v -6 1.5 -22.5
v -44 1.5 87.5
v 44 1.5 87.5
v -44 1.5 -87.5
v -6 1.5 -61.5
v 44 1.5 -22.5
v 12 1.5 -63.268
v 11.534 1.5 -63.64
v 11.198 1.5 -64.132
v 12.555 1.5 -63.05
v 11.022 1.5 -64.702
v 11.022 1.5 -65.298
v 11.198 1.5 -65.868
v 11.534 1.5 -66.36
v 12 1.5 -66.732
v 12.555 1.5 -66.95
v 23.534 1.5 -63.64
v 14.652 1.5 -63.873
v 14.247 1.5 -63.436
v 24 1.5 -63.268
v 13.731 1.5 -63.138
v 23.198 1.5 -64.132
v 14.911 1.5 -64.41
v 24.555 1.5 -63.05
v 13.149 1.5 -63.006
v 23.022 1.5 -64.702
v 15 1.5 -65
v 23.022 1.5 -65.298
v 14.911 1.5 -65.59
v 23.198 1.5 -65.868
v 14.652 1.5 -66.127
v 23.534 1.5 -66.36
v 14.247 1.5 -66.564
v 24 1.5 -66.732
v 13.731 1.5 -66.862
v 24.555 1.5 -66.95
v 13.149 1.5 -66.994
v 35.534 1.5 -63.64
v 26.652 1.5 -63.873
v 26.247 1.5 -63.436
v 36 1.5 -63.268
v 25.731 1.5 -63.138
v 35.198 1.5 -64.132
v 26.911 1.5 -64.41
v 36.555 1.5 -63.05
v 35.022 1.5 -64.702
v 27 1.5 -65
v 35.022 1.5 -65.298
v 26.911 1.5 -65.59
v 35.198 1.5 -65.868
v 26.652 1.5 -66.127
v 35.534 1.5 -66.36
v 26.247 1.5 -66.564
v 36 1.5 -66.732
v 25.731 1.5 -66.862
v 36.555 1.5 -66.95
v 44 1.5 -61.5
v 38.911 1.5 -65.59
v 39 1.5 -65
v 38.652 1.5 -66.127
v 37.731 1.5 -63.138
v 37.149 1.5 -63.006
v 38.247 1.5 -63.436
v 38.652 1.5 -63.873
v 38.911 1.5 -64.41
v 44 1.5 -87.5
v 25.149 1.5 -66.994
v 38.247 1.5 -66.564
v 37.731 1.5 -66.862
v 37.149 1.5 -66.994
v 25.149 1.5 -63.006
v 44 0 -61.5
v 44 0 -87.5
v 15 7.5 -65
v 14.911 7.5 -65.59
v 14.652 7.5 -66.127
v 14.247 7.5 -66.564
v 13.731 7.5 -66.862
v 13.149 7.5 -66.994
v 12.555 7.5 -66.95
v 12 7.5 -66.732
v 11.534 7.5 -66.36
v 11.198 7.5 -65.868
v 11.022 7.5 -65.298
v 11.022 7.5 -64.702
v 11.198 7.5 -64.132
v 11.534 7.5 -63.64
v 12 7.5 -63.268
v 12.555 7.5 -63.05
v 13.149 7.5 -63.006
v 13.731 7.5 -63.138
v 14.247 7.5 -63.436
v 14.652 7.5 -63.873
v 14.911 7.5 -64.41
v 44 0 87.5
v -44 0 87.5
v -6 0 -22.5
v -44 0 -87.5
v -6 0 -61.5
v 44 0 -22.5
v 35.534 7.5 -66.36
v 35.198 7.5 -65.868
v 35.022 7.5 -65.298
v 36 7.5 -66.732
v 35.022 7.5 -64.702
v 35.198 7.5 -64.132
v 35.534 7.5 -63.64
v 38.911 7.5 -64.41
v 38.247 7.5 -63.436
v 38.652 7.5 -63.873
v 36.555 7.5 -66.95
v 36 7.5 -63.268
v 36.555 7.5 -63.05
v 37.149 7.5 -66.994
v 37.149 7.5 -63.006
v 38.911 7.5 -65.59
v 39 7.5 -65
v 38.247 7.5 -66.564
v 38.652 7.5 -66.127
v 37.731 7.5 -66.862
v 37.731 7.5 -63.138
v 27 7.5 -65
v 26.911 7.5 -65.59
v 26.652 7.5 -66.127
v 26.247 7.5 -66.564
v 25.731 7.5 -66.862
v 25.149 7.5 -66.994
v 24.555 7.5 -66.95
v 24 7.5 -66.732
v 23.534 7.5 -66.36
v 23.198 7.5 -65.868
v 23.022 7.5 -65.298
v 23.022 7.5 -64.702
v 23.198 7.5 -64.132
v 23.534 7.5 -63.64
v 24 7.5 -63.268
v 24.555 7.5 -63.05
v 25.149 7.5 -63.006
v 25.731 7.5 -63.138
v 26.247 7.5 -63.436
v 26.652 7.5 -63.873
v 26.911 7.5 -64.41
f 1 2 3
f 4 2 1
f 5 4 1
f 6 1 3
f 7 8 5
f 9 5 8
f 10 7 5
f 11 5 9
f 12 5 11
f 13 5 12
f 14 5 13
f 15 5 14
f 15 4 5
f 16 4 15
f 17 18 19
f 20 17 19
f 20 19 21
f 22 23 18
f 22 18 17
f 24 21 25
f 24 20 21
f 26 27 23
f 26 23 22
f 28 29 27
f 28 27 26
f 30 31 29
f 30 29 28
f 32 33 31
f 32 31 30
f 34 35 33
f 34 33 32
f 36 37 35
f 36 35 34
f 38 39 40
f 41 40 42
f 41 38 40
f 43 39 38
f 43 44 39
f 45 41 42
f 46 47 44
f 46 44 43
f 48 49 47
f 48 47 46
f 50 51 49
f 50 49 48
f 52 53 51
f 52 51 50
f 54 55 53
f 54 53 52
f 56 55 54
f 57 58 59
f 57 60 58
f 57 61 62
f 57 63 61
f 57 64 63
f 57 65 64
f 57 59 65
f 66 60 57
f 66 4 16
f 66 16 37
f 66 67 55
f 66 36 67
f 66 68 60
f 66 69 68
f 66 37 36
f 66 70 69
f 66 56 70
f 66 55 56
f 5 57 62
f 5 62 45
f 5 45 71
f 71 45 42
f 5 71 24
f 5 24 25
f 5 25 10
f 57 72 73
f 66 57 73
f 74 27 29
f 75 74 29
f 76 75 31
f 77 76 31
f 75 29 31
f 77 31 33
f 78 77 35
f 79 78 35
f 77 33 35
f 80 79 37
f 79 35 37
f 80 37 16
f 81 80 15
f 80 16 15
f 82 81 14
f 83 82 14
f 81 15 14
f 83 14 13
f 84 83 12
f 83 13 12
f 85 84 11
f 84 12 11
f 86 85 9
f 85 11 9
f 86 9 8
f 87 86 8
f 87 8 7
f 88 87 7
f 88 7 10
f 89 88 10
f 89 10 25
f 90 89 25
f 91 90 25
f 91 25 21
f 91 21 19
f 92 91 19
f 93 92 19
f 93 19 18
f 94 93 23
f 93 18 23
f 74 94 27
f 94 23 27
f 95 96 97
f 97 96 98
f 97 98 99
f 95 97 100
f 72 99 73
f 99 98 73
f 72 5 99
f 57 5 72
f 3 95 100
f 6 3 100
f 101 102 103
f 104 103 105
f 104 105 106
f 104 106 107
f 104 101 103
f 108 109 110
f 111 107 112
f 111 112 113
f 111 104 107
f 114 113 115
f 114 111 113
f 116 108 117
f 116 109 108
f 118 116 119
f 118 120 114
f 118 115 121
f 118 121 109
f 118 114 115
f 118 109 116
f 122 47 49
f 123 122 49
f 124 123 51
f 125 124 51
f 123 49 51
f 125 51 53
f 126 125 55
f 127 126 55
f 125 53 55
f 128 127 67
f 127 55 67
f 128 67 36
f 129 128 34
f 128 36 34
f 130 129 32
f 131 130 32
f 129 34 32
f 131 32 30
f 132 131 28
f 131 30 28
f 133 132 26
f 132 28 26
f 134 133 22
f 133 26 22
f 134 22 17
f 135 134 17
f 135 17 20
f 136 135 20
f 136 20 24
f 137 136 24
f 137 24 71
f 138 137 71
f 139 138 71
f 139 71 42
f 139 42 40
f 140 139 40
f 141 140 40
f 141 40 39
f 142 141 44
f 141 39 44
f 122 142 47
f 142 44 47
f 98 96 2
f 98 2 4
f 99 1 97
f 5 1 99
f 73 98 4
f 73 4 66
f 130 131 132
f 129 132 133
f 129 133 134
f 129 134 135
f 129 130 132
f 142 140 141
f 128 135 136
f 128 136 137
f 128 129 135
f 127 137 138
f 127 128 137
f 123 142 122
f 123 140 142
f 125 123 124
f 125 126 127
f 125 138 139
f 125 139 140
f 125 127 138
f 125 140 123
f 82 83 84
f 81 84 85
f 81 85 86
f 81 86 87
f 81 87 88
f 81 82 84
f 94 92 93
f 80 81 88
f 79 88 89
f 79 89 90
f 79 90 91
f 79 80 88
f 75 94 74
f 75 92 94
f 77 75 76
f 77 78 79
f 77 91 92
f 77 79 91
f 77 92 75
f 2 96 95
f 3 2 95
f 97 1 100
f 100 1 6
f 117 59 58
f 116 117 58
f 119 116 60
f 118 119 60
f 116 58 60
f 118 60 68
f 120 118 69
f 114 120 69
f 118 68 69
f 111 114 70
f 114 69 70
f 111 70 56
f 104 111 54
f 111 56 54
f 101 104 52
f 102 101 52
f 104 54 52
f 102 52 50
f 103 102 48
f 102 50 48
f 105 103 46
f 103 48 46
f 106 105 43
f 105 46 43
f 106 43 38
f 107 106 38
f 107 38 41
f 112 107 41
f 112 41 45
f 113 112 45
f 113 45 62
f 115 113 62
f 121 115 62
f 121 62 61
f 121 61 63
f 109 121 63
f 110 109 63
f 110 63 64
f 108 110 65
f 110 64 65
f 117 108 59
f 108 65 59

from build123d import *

# Parameters (mm, degrees)
SKETCH1_W           = 88
SKETCH1_H           = 175
BOSS_EXTRUDE1_DEPTH = 1.5
SKETCH2_W           = 50
SKETCH2_H           = 39
CUT_EXTRUDE1_DEPTH  = 1.5
SKETCH3_R           = 2
BOSS_EXTRUDE2_DEPTH = 6


with BuildPart() as part:
    # Sketch1 → Boss-Extrude1 (new body)
    with BuildSketch(Plane(origin=(0, 0, 0), x_dir=(1, 0, 0), z_dir=(0, 1, 0))):
        Rectangle(SKETCH1_W, SKETCH1_H)
    extrude(amount=BOSS_EXTRUDE1_DEPTH)

    # Sketch2 → Cut-Extrude1 (cut)
    with BuildSketch(Plane(origin=(0, 1.5, 0), x_dir=(1, 0, 0), z_dir=(0, 1, 0))):
        with Locations((19, 42)):
            Rectangle(SKETCH2_W, SKETCH2_H)
    extrude(amount=-CUT_EXTRUDE1_DEPTH, mode=Mode.SUBTRACT)

    # Sketch3 → Boss-Extrude2 (add)
    with BuildSketch(Plane(origin=(0, 1.5, 0), x_dir=(1, 0, 0), z_dir=(0, 1, 0))):
        with Locations((37, 65)):
            Circle(SKETCH3_R)
        with Locations((25, 65)):
            Circle(SKETCH3_R)
        with Locations((13, 65)):
            Circle(SKETCH3_R)
    extrude(amount=BOSS_EXTRUDE2_DEPTH)


solid = part.part
